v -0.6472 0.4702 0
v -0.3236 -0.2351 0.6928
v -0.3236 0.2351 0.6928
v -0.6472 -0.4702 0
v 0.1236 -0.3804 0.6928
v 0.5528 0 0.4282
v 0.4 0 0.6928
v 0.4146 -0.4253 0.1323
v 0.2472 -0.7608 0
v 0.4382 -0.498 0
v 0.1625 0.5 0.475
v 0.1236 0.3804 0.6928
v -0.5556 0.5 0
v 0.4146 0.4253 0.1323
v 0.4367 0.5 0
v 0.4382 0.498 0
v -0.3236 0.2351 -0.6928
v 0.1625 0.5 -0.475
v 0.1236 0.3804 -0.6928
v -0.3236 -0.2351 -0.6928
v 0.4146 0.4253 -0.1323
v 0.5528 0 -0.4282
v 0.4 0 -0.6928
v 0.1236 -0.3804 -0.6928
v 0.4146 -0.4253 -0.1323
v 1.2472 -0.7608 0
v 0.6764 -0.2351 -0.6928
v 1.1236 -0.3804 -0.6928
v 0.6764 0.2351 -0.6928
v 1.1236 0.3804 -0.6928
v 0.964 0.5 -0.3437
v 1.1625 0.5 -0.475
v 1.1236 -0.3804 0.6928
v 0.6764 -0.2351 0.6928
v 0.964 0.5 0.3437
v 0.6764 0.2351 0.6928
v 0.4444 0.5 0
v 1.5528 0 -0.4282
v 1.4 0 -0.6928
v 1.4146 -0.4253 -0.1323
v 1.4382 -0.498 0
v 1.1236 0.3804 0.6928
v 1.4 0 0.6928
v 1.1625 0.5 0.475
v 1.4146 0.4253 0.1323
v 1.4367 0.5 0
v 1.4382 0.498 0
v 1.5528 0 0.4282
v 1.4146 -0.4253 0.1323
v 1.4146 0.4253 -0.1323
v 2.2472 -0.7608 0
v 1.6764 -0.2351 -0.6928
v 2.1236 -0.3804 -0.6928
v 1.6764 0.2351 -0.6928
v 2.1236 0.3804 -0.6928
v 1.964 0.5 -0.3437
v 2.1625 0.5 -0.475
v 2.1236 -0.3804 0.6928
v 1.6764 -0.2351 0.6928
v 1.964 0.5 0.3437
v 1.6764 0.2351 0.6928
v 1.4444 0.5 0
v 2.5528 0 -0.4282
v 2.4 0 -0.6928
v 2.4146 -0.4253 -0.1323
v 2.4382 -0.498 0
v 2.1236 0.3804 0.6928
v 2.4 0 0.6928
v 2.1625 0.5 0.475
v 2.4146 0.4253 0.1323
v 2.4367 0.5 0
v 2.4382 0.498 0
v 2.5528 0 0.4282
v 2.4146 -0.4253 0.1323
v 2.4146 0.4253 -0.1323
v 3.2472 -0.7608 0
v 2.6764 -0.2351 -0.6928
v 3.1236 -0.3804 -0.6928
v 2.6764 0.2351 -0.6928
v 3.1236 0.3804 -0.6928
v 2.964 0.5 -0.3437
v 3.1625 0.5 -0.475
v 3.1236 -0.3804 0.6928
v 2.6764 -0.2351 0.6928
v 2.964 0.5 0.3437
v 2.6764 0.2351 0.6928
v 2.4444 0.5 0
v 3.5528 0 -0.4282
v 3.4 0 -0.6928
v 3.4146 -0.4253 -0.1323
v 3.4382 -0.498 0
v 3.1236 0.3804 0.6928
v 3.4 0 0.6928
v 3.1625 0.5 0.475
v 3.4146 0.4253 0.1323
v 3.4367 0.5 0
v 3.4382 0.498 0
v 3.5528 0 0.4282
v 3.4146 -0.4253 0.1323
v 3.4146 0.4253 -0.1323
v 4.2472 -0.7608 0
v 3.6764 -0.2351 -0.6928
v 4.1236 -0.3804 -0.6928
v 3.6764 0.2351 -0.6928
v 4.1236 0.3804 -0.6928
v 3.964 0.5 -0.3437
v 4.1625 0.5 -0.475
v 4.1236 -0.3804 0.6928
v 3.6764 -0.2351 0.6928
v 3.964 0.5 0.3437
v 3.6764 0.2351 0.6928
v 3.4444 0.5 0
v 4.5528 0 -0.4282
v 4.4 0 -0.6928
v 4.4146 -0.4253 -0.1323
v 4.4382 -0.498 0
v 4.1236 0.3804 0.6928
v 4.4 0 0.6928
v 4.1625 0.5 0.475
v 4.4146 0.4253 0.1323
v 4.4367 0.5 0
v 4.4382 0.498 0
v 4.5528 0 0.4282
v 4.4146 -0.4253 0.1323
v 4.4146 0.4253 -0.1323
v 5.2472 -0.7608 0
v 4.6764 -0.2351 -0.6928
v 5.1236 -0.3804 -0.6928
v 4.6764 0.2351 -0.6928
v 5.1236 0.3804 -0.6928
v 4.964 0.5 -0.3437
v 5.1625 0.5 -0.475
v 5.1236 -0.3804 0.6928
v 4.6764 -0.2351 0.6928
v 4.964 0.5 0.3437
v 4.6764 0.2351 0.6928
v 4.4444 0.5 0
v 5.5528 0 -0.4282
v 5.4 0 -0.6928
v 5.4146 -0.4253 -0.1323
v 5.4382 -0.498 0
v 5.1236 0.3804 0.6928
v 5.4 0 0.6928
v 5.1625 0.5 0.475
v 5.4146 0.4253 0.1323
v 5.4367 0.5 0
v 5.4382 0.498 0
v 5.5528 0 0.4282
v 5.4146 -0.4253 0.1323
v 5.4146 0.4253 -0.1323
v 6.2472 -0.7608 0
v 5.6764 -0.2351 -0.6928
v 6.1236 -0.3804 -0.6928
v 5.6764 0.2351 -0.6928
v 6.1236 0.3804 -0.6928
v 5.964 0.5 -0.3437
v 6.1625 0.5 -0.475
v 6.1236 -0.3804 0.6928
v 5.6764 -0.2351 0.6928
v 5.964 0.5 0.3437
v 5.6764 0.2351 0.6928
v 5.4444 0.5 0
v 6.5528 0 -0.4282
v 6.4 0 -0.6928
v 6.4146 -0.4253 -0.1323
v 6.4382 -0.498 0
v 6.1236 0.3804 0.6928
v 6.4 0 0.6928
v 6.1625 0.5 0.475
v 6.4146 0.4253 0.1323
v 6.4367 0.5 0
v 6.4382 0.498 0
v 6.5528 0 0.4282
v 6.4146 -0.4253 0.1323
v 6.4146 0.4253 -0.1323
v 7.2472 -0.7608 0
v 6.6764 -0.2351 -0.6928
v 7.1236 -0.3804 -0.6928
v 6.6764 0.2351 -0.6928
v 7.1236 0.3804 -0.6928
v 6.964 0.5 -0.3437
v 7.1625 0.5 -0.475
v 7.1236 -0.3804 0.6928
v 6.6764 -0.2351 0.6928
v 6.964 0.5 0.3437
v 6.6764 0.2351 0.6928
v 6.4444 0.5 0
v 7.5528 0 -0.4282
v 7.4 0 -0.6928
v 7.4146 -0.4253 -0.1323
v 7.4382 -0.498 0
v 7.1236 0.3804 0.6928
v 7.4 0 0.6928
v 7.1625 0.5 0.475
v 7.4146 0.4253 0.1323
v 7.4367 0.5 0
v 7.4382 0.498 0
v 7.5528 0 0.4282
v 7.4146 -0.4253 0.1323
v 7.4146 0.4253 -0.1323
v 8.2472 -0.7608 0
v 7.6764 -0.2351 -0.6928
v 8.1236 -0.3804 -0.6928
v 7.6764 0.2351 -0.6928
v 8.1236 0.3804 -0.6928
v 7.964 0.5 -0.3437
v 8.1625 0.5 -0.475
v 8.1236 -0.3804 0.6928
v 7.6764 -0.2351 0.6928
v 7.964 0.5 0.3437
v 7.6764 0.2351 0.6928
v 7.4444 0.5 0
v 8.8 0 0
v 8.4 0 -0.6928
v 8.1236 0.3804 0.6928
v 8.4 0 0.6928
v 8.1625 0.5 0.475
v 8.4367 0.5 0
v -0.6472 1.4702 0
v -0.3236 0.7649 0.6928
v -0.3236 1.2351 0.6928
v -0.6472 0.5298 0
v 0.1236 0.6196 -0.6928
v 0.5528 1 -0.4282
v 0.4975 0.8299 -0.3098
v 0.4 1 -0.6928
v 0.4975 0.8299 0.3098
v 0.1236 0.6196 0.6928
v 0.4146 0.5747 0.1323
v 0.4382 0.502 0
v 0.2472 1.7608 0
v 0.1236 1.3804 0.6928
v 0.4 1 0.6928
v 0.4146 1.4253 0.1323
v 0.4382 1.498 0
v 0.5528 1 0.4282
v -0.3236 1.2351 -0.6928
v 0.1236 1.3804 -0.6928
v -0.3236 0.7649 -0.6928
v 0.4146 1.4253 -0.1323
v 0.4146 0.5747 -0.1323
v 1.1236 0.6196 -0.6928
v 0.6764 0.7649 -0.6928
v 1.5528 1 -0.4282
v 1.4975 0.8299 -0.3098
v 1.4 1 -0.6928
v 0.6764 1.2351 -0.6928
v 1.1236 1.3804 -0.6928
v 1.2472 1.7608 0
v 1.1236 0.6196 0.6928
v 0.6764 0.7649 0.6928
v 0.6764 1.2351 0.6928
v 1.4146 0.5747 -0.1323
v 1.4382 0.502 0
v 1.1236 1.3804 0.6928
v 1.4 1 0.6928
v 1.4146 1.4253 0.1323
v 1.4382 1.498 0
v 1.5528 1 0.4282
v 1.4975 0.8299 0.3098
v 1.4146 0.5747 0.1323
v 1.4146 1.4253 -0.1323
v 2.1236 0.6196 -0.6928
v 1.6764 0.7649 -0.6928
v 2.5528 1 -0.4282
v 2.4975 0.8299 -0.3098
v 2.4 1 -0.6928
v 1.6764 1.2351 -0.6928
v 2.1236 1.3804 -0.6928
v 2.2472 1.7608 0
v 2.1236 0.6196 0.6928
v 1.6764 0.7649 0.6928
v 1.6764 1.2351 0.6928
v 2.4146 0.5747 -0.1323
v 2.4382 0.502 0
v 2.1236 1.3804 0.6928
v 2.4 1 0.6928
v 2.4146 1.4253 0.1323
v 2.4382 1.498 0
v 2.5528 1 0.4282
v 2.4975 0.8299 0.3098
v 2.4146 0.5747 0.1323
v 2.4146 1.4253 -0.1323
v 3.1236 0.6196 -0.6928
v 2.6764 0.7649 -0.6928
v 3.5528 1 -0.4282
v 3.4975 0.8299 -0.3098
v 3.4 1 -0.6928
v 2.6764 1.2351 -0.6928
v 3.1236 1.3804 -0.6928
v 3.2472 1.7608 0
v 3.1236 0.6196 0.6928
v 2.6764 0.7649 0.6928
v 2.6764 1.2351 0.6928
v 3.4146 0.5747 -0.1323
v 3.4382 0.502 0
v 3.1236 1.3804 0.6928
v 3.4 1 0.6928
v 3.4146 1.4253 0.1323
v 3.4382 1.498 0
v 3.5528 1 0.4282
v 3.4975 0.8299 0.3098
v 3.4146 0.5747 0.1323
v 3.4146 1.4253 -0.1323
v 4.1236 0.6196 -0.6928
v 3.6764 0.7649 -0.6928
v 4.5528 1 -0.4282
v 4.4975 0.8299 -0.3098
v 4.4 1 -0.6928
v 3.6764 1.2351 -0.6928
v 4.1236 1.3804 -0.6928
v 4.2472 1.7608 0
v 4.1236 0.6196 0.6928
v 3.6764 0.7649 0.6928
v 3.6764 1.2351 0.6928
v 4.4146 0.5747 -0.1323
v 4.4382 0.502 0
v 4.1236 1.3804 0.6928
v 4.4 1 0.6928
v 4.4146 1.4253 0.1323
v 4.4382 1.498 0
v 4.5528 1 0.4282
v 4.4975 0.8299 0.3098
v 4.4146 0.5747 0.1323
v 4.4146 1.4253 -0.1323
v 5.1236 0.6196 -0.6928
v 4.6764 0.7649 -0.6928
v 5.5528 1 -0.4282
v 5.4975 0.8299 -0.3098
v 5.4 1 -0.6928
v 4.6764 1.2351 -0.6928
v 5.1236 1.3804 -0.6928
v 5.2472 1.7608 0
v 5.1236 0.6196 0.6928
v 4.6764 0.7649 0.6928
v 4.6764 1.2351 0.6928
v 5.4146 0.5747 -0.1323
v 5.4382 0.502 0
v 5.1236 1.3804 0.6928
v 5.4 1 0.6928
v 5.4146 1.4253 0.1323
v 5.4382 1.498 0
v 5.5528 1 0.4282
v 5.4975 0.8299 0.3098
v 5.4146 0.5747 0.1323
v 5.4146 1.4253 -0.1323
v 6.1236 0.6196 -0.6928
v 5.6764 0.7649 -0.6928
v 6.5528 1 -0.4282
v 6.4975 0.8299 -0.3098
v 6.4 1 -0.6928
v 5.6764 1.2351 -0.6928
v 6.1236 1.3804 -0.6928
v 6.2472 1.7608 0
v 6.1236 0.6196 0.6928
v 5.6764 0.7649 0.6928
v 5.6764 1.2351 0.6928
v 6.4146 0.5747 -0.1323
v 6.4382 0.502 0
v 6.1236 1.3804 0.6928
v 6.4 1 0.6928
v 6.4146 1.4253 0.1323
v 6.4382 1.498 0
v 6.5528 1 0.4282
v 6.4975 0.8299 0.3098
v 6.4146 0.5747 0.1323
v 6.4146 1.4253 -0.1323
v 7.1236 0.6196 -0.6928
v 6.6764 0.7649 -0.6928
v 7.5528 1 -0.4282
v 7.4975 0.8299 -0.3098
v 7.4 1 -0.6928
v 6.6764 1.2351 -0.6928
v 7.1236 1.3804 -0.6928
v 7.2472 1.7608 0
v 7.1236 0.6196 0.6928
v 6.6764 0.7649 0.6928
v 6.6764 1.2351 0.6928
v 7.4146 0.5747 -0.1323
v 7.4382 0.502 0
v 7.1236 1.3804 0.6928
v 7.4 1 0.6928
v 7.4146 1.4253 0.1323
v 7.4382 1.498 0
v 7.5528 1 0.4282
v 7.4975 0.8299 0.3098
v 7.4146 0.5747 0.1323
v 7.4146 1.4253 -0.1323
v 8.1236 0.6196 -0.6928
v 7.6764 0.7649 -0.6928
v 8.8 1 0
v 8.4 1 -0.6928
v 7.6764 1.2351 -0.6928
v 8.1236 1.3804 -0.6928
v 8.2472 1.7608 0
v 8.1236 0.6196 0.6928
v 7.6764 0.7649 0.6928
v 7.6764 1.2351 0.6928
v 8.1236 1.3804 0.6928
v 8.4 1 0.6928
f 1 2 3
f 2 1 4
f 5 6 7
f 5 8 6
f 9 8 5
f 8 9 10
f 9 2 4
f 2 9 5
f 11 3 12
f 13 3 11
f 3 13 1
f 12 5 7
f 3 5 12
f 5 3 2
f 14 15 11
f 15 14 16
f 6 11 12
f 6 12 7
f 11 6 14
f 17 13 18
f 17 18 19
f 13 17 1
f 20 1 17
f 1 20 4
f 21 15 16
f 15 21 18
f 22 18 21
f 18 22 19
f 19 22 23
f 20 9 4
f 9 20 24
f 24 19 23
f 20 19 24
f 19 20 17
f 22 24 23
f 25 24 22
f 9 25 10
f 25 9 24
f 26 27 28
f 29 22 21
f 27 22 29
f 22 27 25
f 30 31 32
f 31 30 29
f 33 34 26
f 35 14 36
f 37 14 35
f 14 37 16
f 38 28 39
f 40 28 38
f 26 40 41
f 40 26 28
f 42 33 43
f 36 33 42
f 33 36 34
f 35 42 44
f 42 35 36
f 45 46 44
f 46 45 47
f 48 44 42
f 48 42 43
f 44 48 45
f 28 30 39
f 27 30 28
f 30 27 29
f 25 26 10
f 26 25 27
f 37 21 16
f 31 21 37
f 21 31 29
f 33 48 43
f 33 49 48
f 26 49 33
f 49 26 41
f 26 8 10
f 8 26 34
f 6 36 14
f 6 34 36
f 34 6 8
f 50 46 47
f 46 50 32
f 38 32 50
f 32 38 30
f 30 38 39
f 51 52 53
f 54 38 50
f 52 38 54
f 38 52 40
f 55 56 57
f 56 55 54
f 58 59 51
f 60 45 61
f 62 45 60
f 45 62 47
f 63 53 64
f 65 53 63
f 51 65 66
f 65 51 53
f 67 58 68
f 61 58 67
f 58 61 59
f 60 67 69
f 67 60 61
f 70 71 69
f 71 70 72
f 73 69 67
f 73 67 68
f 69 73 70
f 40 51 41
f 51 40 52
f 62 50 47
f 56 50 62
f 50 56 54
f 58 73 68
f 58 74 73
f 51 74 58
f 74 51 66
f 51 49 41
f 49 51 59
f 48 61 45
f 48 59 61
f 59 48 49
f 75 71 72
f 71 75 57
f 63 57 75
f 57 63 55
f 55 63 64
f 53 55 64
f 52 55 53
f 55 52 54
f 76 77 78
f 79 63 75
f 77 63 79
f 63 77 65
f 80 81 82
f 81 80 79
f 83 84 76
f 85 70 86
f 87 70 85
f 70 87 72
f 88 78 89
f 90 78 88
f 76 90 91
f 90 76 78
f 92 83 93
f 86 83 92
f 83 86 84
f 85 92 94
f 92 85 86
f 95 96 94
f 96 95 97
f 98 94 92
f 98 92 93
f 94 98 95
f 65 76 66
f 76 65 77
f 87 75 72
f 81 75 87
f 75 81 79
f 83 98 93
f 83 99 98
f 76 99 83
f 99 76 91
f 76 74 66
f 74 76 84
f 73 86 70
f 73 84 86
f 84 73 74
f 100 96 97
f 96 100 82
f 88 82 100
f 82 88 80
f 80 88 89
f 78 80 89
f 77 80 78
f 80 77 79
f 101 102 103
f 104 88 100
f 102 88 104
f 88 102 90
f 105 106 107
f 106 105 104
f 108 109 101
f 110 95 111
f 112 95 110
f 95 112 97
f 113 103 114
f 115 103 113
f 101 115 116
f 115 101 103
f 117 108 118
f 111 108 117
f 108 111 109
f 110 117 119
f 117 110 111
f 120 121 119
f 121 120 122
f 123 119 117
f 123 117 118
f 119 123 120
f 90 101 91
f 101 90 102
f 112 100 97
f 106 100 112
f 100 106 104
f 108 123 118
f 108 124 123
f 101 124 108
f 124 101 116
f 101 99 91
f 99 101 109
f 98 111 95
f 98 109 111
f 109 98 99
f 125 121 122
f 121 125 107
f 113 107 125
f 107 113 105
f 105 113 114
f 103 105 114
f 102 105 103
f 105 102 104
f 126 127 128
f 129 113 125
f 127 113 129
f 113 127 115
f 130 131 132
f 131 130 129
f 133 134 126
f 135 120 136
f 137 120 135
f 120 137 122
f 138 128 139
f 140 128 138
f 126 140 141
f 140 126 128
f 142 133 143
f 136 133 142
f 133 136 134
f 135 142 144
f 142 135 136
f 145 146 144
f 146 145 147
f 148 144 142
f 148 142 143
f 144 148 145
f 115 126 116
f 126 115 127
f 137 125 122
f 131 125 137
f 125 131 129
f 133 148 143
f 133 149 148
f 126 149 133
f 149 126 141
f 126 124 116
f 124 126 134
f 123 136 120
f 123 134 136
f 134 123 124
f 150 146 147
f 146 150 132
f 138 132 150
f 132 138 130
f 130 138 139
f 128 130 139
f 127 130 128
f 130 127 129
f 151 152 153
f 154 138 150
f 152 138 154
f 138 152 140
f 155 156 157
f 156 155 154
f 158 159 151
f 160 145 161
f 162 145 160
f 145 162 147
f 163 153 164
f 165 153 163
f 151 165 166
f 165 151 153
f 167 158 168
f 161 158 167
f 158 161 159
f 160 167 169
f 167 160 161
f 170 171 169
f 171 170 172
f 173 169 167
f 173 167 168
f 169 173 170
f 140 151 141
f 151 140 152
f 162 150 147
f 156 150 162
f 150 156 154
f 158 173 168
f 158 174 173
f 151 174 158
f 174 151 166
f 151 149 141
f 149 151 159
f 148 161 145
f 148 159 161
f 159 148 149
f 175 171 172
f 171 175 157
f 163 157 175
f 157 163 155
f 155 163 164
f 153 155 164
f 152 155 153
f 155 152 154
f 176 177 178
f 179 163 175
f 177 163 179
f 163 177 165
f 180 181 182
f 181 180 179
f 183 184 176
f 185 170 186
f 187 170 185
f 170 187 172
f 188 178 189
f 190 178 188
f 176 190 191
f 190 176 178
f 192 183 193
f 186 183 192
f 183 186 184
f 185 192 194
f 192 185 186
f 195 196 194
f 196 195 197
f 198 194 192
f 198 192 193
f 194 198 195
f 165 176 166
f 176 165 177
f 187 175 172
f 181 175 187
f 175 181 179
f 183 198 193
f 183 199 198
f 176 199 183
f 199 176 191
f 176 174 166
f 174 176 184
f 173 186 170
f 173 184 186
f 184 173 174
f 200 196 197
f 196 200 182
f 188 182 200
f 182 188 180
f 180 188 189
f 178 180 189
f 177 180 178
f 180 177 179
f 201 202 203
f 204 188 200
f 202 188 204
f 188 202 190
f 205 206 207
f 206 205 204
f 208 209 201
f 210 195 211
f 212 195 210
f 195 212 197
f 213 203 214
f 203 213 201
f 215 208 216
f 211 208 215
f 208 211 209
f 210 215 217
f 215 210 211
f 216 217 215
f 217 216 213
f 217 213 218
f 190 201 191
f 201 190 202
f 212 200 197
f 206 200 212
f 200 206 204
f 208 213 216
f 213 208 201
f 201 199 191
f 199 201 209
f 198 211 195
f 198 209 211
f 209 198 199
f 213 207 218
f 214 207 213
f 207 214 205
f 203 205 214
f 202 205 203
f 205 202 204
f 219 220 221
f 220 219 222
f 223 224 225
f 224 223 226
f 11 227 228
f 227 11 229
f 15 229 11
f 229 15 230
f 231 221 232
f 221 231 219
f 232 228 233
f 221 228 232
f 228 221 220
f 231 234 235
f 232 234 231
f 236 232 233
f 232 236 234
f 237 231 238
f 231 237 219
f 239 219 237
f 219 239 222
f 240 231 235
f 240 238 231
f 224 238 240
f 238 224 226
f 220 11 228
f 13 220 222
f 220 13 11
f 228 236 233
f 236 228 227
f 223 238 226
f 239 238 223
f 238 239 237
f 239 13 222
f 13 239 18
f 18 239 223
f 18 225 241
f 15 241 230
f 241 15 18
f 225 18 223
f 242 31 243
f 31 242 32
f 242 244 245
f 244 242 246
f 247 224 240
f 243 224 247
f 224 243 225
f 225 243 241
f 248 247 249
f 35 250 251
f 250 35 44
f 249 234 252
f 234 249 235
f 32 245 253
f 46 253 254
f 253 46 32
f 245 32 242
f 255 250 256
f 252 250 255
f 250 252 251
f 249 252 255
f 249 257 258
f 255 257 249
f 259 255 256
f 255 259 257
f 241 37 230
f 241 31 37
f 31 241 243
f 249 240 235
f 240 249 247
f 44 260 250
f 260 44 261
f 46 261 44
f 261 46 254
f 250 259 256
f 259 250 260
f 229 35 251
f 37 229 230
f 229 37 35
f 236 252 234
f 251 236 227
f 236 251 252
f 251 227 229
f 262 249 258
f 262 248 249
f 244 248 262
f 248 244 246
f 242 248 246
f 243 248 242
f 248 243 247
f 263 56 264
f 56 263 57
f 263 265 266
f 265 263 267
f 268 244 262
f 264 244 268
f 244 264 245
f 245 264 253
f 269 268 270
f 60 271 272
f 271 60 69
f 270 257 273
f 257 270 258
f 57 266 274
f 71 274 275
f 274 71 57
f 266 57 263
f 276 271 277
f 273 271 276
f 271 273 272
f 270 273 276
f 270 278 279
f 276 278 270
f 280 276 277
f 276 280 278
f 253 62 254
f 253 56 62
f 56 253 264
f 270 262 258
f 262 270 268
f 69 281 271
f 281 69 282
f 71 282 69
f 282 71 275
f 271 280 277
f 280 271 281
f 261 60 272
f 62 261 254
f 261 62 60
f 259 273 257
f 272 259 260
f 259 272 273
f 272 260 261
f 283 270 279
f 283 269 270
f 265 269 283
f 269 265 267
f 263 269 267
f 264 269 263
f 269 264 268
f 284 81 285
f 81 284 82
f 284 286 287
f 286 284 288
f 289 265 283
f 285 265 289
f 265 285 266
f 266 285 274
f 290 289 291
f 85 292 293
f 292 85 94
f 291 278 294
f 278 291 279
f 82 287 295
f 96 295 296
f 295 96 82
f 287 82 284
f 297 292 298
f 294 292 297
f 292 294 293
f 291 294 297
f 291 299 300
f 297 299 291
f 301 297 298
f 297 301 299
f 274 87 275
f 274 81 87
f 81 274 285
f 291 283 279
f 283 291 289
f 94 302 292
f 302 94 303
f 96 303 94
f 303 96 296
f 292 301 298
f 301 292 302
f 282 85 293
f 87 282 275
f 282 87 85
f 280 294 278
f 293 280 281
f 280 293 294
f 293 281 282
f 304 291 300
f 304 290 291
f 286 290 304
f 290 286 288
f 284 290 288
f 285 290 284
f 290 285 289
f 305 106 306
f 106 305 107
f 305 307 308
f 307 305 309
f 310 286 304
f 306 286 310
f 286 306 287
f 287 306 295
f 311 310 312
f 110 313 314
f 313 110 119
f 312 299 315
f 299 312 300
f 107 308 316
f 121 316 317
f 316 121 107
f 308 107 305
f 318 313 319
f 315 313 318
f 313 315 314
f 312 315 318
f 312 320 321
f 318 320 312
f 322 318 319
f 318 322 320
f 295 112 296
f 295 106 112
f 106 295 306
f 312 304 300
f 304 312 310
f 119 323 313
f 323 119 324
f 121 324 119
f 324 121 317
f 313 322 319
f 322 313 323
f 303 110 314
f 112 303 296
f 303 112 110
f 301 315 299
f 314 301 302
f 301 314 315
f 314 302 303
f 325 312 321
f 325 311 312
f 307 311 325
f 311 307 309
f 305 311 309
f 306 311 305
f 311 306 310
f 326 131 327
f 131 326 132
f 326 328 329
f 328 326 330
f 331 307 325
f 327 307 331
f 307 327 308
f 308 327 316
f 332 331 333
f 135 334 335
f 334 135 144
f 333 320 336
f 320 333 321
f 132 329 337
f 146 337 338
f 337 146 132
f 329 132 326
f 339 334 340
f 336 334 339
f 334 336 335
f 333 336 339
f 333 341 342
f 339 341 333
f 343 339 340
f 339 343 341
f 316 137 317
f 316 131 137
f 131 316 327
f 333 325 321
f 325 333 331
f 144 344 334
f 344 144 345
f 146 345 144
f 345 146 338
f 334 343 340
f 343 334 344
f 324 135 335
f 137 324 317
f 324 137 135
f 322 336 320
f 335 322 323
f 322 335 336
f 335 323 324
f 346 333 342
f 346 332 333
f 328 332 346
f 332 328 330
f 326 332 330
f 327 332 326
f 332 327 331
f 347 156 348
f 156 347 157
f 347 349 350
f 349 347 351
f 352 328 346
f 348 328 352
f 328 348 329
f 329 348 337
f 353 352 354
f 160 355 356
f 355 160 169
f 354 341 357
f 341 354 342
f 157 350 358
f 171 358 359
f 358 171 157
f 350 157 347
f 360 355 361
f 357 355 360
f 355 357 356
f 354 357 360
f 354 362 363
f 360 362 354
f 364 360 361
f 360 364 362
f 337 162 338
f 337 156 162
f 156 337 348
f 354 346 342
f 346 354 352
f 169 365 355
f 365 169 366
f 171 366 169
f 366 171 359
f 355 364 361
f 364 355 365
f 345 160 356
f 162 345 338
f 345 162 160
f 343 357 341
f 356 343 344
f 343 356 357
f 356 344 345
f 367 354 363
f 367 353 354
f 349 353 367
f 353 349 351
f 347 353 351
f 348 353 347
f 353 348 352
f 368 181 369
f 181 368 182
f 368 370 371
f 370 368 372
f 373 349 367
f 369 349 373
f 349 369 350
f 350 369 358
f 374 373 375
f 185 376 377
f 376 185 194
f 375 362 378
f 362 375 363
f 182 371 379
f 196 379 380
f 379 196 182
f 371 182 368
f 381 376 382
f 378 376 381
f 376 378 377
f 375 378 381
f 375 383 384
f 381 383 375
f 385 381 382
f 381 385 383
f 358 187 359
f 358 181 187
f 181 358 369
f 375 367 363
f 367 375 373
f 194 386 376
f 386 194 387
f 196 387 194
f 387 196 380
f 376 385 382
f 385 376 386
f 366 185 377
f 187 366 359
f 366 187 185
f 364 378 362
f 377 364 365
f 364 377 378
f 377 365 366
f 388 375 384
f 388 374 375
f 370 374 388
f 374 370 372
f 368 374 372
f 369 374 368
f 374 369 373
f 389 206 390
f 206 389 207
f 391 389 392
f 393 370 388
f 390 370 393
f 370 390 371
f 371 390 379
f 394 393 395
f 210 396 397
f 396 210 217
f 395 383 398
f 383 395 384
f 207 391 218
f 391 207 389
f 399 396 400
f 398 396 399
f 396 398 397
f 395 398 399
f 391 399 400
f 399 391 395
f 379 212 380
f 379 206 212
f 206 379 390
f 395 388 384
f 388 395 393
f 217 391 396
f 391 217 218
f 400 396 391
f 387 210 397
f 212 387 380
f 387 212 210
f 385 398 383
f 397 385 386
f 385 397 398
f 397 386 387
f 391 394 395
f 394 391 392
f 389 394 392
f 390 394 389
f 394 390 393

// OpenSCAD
// Volume: 20.161865606293865, SurfaceArea: 79.89314471994713
$fn=5;
radius=0.8;

translate([0,0]) color("#ff0000") sphere(radius);
translate([1,0]) color("#ff7f00") sphere(radius);
translate([2,0]) color("#ffff00") sphere(radius);
translate([3,0]) color("#00FF00") sphere(radius);
translate([4,0]) color("#0000ff") sphere(radius);
translate([5,0]) color("#4b00ff") sphere(radius);
translate([6,0]) color("#9400d3") sphere(radius);
translate([7,0]) color("#000000Ff") sphere(radius);
translate([8,0]) color("#00000080") sphere(radius);
translate([0,1]) color("#f00") sphere(radius);
translate([1,1]) color("#f70") sphere(radius);
translate([2,1]) color("#ff0") sphere(radius);
translate([3,1]) color("#0F0") sphere(radius);
translate([4,1]) color("#00f") sphere(radius);
translate([5,1]) color("#40f") sphere(radius);
translate([6,1]) color("#90d") sphere(radius);
translate([7,1]) color("#000F") sphere(radius);
translate([8,1]) color("#0008") sphere(radius);
